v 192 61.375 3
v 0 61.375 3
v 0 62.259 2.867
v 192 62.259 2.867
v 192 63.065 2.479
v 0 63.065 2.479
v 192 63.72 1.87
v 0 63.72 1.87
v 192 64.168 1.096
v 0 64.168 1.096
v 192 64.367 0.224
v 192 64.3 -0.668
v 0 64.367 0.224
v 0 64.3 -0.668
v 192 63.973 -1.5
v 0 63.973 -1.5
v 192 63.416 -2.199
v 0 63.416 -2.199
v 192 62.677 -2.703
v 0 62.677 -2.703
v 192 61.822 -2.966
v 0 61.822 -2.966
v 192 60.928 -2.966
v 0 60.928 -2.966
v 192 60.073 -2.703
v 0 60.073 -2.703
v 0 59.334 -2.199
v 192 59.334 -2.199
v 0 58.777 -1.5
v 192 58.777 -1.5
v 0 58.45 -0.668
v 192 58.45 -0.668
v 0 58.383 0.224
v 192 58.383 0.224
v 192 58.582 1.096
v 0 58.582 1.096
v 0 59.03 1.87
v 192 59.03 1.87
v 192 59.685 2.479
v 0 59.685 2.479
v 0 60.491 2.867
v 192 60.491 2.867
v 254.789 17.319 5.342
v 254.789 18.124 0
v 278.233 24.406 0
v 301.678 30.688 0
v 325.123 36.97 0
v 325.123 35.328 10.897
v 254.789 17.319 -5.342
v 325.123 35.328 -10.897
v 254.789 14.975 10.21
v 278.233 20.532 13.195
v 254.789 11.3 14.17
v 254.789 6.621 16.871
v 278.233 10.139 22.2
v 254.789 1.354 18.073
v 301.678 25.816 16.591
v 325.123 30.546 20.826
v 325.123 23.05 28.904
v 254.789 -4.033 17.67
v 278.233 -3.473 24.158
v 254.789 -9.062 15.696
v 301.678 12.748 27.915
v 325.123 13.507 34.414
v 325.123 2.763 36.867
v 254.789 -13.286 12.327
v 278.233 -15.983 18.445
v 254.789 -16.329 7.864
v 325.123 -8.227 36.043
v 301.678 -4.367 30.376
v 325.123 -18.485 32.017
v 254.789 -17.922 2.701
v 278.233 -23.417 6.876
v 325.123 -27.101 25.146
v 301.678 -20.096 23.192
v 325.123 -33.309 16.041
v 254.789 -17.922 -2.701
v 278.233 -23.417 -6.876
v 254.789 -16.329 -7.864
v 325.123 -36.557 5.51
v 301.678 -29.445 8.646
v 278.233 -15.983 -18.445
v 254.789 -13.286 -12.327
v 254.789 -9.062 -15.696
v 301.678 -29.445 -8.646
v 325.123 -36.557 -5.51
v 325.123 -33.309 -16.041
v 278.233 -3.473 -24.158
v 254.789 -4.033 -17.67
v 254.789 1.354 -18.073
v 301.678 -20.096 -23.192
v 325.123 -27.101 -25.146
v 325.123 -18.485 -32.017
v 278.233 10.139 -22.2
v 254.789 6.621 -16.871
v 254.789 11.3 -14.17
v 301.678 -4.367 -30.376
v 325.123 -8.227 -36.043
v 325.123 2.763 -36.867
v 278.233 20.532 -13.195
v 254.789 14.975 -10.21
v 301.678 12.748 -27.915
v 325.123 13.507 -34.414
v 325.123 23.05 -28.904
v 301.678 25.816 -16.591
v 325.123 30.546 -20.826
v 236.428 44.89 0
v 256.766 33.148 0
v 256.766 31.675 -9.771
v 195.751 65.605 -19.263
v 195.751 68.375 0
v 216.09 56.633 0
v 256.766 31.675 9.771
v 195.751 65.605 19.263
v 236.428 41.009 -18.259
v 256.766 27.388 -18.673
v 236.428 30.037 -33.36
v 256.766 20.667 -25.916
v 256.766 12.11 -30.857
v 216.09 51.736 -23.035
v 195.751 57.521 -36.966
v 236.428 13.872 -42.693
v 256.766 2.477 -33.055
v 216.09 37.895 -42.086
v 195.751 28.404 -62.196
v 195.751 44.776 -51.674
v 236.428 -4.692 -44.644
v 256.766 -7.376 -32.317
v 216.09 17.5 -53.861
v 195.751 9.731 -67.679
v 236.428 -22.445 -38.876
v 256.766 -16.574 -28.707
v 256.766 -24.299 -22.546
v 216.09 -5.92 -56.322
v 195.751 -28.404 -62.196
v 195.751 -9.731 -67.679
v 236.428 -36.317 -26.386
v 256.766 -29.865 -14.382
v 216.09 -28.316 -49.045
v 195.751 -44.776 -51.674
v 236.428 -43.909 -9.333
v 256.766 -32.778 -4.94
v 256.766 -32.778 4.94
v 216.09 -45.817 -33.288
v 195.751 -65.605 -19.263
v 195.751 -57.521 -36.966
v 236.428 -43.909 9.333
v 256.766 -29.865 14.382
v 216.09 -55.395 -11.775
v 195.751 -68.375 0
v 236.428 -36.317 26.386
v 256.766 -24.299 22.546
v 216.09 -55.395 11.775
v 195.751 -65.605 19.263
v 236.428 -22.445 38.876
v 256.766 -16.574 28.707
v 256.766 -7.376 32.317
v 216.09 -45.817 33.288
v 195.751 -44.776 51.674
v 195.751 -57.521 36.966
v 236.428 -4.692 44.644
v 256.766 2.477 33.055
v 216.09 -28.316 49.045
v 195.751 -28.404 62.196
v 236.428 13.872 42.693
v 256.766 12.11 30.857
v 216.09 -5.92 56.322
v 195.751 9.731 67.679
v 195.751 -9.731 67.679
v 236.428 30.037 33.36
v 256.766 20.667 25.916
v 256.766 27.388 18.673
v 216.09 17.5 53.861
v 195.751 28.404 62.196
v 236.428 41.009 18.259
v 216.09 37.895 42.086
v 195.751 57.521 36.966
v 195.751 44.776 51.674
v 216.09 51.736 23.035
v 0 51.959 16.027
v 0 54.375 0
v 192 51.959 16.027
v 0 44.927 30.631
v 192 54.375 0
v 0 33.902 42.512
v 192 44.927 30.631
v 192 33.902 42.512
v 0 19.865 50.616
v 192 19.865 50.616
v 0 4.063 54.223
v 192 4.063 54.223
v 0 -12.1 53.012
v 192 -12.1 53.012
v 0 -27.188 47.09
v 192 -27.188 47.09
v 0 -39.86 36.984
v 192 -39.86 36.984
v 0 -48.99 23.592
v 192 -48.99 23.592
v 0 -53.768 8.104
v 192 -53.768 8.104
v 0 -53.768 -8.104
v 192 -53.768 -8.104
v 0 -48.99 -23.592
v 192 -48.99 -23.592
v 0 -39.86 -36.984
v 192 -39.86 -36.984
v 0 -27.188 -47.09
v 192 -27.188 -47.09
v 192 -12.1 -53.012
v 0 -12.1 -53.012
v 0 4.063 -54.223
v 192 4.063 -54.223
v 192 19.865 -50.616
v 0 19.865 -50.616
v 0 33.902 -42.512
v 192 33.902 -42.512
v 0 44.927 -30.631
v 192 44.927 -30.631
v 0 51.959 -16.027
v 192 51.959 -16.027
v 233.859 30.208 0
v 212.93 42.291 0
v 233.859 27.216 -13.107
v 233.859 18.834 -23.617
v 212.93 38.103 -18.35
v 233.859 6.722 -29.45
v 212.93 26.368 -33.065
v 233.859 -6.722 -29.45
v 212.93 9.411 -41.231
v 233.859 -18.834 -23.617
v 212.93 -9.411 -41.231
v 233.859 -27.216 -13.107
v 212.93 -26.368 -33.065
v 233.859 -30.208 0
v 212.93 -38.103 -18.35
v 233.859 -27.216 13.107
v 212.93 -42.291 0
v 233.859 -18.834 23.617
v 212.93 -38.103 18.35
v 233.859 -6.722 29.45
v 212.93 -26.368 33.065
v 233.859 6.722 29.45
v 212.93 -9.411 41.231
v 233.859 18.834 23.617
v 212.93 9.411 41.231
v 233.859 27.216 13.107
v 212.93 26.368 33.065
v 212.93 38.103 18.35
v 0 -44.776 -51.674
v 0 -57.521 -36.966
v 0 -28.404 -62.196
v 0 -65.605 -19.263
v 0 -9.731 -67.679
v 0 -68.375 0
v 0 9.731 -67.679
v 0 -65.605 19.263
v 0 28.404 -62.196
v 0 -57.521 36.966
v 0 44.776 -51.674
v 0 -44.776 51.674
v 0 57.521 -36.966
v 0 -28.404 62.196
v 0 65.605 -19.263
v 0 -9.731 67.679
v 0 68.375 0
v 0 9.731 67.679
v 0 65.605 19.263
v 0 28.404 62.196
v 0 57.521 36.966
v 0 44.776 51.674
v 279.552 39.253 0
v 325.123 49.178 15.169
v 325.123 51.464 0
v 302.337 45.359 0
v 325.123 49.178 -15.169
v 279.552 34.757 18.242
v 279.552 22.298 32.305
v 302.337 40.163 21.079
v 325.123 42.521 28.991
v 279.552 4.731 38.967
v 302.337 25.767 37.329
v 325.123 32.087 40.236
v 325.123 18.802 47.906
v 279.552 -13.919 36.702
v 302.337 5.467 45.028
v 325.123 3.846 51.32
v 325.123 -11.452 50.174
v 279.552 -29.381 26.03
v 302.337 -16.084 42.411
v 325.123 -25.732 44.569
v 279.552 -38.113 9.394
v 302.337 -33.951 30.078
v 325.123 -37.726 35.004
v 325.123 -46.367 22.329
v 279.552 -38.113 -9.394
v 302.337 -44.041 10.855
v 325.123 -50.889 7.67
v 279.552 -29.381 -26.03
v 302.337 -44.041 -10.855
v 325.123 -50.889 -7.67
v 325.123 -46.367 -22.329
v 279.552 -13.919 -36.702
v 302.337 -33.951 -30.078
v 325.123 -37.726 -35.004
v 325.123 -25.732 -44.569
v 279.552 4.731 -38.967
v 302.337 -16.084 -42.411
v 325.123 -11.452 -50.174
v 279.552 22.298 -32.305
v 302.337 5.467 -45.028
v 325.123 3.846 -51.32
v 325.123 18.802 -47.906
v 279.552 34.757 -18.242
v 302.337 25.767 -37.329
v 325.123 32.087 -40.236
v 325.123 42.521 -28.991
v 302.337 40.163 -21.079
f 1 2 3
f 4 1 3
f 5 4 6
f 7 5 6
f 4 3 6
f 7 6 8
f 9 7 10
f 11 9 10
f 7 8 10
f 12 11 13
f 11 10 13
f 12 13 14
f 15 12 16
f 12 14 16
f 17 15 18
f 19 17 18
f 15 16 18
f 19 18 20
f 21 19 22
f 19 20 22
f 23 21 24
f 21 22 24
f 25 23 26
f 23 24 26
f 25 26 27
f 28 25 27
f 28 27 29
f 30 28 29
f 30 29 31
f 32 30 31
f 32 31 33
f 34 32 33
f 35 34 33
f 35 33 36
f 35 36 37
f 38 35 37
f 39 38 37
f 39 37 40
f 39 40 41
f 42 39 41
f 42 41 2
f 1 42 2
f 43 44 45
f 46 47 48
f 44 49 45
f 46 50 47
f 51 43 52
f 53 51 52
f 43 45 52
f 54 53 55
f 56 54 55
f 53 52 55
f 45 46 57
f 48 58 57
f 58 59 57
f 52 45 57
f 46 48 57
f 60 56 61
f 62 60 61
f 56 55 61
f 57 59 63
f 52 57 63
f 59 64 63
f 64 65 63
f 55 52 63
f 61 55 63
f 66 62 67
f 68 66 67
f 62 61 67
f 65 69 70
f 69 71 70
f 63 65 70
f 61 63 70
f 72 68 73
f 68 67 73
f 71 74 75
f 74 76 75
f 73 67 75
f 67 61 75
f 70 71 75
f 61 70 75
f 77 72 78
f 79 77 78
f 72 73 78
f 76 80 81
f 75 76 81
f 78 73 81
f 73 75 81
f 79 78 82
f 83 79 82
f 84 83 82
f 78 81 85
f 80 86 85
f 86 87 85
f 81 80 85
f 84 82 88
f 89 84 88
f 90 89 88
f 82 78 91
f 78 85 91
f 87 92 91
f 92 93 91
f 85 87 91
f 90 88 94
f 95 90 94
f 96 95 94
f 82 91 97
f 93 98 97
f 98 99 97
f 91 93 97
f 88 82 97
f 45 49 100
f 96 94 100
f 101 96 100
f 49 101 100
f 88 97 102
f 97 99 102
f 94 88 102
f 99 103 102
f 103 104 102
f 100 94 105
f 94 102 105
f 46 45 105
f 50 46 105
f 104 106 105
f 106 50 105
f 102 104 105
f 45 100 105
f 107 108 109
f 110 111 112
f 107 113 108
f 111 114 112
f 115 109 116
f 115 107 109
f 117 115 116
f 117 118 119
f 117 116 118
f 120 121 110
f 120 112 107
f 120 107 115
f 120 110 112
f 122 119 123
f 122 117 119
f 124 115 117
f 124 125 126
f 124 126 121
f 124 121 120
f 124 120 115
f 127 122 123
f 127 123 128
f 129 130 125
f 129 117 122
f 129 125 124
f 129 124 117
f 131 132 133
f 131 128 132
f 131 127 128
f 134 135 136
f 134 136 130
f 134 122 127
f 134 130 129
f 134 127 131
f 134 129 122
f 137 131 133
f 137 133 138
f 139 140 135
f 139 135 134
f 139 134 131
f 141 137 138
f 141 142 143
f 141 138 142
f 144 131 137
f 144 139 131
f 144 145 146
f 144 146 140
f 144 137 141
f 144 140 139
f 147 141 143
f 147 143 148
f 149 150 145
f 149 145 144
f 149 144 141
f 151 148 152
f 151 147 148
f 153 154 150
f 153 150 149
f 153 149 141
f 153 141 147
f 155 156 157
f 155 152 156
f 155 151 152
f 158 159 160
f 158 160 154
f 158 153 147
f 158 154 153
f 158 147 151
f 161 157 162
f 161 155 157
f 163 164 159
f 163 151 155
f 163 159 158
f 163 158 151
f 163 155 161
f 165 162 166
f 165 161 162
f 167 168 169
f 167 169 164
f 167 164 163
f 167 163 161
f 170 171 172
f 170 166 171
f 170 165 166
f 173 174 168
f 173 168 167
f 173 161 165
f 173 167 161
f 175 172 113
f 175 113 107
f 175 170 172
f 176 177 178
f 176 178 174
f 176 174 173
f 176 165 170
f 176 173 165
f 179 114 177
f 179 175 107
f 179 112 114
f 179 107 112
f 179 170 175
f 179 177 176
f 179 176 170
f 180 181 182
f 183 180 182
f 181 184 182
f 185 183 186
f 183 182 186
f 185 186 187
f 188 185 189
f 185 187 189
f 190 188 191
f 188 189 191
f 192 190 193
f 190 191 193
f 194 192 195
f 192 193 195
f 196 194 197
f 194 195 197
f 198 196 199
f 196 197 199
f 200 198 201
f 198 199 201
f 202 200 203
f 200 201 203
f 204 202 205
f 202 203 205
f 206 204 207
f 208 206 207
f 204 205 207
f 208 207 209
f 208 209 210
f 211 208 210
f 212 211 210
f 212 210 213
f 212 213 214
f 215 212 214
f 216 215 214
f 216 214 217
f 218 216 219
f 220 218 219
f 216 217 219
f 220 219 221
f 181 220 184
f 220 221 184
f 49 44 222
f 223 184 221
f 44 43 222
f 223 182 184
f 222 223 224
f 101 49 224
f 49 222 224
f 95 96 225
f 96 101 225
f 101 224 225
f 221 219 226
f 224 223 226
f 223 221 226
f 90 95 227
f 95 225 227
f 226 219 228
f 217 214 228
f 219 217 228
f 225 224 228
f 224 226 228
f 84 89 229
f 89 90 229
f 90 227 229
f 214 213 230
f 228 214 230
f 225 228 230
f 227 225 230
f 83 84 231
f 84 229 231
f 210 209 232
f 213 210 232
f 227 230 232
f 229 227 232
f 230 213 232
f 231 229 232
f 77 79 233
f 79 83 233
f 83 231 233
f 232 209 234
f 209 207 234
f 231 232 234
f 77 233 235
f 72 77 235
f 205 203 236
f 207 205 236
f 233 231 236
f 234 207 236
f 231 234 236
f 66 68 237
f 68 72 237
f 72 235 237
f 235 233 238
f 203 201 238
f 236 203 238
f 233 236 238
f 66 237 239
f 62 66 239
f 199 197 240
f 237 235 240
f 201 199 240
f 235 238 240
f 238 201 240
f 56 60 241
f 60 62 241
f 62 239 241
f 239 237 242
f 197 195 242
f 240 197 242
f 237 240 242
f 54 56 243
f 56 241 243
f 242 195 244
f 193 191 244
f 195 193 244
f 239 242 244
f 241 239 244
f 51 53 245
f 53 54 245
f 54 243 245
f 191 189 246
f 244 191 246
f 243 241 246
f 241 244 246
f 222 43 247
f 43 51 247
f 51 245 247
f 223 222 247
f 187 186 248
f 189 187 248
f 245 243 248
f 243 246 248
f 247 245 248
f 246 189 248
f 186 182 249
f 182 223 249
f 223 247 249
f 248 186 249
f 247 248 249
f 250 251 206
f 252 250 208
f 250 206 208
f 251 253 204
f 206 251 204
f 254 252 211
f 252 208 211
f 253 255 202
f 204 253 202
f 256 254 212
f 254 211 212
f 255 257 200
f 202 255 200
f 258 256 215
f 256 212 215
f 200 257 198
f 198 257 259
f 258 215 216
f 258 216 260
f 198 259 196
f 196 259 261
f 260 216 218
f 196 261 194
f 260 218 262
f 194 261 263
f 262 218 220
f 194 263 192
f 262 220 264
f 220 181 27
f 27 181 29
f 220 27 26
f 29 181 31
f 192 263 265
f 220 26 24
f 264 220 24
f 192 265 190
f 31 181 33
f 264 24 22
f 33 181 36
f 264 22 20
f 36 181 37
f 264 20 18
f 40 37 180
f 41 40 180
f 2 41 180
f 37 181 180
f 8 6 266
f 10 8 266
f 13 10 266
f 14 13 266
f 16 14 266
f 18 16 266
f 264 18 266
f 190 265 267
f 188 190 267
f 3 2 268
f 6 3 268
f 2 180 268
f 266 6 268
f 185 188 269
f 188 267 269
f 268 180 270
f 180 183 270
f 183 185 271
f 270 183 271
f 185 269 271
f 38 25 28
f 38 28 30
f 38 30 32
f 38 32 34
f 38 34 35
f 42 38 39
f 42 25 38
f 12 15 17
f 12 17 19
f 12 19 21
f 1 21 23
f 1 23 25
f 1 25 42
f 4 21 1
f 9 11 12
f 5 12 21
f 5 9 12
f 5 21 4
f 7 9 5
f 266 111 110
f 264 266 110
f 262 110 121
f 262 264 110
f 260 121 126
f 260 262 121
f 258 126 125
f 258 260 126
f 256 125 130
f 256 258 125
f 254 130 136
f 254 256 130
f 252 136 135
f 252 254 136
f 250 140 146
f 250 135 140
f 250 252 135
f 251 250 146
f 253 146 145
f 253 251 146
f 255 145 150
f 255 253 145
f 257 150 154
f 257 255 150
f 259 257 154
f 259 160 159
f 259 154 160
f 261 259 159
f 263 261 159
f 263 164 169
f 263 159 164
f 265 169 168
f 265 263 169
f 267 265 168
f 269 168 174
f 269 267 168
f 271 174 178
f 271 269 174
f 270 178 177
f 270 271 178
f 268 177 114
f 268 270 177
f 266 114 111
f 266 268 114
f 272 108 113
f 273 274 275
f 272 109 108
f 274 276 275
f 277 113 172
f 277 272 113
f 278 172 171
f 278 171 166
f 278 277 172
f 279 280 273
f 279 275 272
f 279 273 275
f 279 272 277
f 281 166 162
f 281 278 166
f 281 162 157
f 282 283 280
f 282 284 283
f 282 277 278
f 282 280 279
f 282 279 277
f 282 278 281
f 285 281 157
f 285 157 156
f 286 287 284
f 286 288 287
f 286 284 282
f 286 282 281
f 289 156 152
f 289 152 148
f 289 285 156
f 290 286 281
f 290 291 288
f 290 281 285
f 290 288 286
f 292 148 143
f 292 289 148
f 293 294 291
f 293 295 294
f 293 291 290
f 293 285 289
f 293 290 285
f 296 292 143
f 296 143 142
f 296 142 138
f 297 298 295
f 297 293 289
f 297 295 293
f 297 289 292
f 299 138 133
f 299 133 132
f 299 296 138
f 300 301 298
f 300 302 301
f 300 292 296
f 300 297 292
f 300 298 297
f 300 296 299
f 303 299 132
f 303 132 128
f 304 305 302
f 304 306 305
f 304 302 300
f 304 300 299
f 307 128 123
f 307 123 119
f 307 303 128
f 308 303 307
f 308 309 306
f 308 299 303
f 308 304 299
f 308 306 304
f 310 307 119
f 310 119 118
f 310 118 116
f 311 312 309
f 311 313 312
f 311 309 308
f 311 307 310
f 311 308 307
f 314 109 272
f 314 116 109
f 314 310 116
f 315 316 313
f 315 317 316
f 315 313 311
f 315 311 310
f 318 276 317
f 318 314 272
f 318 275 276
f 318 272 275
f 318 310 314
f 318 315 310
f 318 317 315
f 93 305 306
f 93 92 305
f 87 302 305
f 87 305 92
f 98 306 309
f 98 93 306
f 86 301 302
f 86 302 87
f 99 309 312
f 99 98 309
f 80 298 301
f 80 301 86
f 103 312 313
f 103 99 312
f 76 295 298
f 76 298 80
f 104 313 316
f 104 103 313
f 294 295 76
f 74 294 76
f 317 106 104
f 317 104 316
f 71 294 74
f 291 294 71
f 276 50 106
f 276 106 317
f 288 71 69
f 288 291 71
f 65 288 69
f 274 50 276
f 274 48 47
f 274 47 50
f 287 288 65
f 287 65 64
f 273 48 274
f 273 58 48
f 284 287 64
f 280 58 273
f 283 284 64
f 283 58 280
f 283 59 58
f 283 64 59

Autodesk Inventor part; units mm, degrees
ref_plane "YZ Plane" through (0, 0, 0) normal (1, 0, 0) x (0, 1, 0)
ref_plane "XZ Plane" through (0, 0, 0) normal (0, 1, 0) x (-1, 0, 0)
ref_plane "XY Plane" through (0, 0, 0) normal (0, 0, 1) x (1, 0, 0)
sketch "Sketch1" plane through (0, 0, 0) normal (0, 0, 1) x (1, 0, 0)
  line L0 (0, 0) -> (0, 54.375) construction
  line L1 (0, 54.375) -> (192, 54.375)
  line L2 (0, 0) -> (524.135, 0) construction
  line L3 (254.7886, 18.124) -> (254.7886, 0) construction
  line L4 (192, 54.375) -> (254.7886, 18.124)
  line L5 (254.7886, 18.124) -> (325.1228, 36.97)
  line L6 (325.1228, 36.97) -> (325.1228, 0) construction
  line L7 (192, 54.375) -> (192, 0) construction
  line L8 (325.1228, 51.4639) -> (256.7665, 33.1479)
  line L9 (256.7665, 33.1479) -> (195.7513, 68.375)
  line L10 (195.7513, 68.375) -> (0, 68.375)
  line L11 (0, 54.375) -> (0, 68.375)
  line L12 (325.1228, 36.97) -> (325.1228, 51.4639)
  line L13 (195.7513, 68.375) -> (195.7513, 78.375)
  line L14 (195.7513, 78.375) -> (186.3124, 78.375)
  line L15 (186.3124, 78.375) -> (186.3124, 68.375)
  dimension "d0" = 54.375
  dimension "d1" = 192
  dimension "d2" = 18.124
  dimension "d3" = 30
  dimension "d4" = 15
  dimension "d5" = 36.97
  dimension "d6" = 14
  dimension "d12" = 10
revolve "Revolution1" add sketch "Sketch1" angle 360 about axis through (0, 0, 0) along (1, 0, 0) contours L11 L10 L9 L8 L12 L5 L4 L1
sketch "Sketch2" plane through (0, 0, 0) normal (-1, 0, 0) x (0, 0, 1)
  circle A0 centre (0, 0) radius 61.375 construction
  circle A1 centre (0, 61.375) radius 3
  dimension "d8" = 122.75
  dimension "d9" = 6
extrude "Extrusion1" cut sketch "Sketch2" against normal blind 192
properties part number "concept3" material "Aluminum 6061"
